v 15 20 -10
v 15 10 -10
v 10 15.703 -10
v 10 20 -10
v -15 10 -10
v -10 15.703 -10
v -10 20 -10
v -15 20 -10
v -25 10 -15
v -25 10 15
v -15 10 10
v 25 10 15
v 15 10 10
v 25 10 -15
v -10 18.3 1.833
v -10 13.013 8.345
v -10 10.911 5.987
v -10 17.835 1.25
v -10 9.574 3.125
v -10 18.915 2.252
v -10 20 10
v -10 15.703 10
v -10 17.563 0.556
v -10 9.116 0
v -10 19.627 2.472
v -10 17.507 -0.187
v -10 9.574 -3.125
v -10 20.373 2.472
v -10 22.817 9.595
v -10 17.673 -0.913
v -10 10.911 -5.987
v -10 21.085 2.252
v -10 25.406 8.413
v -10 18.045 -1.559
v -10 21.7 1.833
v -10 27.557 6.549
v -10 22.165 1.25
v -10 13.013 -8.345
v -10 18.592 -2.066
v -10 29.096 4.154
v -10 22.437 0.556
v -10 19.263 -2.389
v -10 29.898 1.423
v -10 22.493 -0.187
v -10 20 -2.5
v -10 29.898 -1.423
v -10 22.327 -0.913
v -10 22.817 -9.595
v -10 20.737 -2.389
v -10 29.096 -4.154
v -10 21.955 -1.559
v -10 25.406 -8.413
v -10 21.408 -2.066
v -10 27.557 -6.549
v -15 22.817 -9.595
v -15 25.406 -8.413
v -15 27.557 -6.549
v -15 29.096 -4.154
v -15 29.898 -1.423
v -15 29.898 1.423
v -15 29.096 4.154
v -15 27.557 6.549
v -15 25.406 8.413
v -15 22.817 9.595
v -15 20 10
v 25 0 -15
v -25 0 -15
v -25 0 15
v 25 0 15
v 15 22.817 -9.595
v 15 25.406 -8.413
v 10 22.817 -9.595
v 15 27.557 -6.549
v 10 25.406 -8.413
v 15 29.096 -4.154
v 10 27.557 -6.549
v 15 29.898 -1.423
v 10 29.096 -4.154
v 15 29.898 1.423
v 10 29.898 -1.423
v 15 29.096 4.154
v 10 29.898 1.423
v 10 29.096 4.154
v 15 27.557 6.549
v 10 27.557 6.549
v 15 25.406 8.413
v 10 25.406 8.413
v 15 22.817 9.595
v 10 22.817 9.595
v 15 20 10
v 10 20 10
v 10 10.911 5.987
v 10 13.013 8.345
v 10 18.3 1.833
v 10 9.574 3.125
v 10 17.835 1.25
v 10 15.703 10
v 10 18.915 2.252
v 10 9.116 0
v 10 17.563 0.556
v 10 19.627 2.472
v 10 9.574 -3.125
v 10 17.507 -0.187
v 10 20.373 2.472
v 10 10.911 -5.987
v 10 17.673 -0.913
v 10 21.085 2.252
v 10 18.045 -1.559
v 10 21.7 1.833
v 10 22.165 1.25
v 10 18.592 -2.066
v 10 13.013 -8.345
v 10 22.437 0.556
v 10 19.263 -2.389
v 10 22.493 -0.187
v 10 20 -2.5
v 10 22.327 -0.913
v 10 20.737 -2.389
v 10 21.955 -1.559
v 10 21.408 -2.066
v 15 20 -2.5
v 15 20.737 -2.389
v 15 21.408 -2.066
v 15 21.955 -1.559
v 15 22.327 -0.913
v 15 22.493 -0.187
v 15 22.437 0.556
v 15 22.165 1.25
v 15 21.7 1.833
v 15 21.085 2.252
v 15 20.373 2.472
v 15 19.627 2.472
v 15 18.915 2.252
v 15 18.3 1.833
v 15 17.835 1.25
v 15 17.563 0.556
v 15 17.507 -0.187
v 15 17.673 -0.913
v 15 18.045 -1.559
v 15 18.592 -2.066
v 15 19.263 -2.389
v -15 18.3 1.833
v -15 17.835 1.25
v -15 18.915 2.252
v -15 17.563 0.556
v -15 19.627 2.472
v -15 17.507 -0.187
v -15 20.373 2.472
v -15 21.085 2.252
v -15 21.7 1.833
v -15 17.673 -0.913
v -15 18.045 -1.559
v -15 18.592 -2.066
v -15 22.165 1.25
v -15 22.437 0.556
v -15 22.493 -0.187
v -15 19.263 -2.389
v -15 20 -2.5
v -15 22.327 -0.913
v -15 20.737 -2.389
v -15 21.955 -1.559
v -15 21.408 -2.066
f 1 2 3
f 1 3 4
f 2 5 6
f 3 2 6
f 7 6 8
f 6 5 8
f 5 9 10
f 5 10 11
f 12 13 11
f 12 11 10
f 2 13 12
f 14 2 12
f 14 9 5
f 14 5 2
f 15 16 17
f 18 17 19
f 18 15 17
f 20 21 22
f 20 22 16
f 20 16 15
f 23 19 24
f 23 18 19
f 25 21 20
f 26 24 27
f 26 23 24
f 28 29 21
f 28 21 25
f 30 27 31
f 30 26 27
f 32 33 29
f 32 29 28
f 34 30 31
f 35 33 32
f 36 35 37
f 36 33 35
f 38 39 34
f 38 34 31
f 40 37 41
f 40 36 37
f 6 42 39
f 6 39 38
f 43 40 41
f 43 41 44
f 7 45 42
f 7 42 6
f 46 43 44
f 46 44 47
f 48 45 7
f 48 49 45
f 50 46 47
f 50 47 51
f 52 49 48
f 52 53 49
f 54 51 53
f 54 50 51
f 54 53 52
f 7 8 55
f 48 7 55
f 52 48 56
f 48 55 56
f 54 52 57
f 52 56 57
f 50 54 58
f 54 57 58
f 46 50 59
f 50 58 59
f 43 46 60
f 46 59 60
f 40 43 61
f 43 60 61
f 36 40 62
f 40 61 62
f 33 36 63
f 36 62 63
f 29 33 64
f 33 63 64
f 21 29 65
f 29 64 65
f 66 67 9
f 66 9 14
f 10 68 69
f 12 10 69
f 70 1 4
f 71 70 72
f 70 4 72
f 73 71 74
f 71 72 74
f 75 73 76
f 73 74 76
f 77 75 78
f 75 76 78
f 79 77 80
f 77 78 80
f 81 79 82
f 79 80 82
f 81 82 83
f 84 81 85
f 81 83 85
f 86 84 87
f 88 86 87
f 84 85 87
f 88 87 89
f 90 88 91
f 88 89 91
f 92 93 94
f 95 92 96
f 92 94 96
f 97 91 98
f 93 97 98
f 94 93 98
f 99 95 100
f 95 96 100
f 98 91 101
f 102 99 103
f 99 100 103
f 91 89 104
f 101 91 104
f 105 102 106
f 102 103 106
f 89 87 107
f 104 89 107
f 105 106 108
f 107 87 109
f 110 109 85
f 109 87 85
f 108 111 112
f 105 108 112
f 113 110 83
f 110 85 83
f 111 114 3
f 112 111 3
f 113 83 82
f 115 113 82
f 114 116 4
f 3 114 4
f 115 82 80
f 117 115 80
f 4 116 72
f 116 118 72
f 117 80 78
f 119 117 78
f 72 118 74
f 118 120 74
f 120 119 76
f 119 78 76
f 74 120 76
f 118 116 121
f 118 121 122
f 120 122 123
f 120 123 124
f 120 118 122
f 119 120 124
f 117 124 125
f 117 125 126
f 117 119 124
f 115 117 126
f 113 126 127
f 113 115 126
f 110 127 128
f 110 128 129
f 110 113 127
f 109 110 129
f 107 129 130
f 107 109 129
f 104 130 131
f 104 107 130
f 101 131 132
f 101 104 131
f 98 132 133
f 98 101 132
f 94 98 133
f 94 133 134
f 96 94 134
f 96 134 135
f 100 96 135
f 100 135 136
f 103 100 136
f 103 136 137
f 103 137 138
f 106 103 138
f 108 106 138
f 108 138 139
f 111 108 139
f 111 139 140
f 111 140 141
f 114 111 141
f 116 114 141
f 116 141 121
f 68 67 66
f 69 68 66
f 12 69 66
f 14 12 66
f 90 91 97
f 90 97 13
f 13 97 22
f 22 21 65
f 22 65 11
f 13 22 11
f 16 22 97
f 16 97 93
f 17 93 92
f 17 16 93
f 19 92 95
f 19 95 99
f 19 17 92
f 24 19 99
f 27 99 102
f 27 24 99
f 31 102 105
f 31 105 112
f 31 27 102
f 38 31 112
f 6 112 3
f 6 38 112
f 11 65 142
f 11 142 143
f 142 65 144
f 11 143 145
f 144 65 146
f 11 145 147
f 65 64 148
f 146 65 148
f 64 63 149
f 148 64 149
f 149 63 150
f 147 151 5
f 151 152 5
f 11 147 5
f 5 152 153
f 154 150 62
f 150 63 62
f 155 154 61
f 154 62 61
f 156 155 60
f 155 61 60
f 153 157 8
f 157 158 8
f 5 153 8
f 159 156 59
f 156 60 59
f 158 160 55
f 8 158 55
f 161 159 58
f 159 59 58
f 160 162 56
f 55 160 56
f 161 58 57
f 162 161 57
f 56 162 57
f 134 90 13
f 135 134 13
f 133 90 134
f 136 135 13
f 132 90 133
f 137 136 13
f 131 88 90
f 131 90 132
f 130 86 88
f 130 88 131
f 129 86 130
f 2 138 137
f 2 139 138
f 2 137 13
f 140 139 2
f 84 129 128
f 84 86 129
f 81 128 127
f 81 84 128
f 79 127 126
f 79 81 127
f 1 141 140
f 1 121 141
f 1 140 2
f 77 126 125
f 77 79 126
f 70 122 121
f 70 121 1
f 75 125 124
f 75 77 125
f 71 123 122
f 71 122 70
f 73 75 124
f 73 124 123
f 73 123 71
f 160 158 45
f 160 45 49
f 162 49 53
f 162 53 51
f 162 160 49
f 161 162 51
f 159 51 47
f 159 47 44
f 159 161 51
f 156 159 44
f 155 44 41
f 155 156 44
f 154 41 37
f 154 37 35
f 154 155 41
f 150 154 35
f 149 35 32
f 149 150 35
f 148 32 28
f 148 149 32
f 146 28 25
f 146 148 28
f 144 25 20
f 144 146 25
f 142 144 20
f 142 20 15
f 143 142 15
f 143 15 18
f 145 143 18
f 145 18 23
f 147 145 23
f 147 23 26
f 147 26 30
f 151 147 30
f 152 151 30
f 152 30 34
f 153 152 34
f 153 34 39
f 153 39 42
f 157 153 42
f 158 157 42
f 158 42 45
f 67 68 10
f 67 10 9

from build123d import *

# Parameters (mm, degrees)
ESQUISSE1_W                  = 50
ESQUISSE1_H                  = 30
BOSS_EXTRU_1_DEPTH           = 10
BOSS_EXTRU_2_DEPTH           = 15
BOSS_EXTRU_2_DEPTH_BACK      = 15
ESQUISSE2_R                  = 2.5
ENL_V_MAT_EXTRU_1_DEPTH      = 10
ENL_V_MAT_EXTRU_1_DEPTH_BACK = 10
ESQUISSE3_R                  = 10.88408721
ESQUISSE3_R_2                = 2.5


with BuildPart() as part:
    # Esquisse1 → Boss.-Extru.1 (new body)
    with BuildSketch(Plane(origin=(0, 0, 0), x_dir=(1, 0, 0), z_dir=(0, 1, 0))):
        Rectangle(ESQUISSE1_W, ESQUISSE1_H)
    extrude(amount=BOSS_EXTRU_1_DEPTH)

    # Esquisse2 → Boss.-Extru.2 (add, two sides: drawn at the far end of the back side and taken through both)
    with BuildSketch(Plane(origin=(0, 0, 0), x_dir=(0, 0, -1), z_dir=(1, 0, 0)).offset(-BOSS_EXTRU_2_DEPTH_BACK)):
        with BuildLine():
            Line((-10, 20), (-10, 10))
            Line((-10, 10), (10, 10))
            Line((10, 10), (10, 20))
            ThreePointArc((10, 20), (0, 30), (-10, 20))
        make_face()
        with Locations((0, 20)):
            Circle(ESQUISSE2_R, mode=Mode.SUBTRACT)
    extrude(amount=BOSS_EXTRU_2_DEPTH + BOSS_EXTRU_2_DEPTH_BACK)

    # Esquisse3 → Enlèv. mat.-Extru.1 (cut, two sides: drawn at the far end of the back side and taken through both)
    with BuildSketch(Plane(origin=(0, 0, 0), x_dir=(0, 0, -1), z_dir=(1, 0, 0)).offset(-ENL_V_MAT_EXTRU_1_DEPTH_BACK)):
        with Locations((0, 20)):
            Circle(ESQUISSE3_R)
        with Locations((0, 20)):
            Circle(ESQUISSE3_R_2, mode=Mode.SUBTRACT)
    extrude(amount=ENL_V_MAT_EXTRU_1_DEPTH + ENL_V_MAT_EXTRU_1_DEPTH_BACK, mode=Mode.SUBTRACT)


solid = part.part
